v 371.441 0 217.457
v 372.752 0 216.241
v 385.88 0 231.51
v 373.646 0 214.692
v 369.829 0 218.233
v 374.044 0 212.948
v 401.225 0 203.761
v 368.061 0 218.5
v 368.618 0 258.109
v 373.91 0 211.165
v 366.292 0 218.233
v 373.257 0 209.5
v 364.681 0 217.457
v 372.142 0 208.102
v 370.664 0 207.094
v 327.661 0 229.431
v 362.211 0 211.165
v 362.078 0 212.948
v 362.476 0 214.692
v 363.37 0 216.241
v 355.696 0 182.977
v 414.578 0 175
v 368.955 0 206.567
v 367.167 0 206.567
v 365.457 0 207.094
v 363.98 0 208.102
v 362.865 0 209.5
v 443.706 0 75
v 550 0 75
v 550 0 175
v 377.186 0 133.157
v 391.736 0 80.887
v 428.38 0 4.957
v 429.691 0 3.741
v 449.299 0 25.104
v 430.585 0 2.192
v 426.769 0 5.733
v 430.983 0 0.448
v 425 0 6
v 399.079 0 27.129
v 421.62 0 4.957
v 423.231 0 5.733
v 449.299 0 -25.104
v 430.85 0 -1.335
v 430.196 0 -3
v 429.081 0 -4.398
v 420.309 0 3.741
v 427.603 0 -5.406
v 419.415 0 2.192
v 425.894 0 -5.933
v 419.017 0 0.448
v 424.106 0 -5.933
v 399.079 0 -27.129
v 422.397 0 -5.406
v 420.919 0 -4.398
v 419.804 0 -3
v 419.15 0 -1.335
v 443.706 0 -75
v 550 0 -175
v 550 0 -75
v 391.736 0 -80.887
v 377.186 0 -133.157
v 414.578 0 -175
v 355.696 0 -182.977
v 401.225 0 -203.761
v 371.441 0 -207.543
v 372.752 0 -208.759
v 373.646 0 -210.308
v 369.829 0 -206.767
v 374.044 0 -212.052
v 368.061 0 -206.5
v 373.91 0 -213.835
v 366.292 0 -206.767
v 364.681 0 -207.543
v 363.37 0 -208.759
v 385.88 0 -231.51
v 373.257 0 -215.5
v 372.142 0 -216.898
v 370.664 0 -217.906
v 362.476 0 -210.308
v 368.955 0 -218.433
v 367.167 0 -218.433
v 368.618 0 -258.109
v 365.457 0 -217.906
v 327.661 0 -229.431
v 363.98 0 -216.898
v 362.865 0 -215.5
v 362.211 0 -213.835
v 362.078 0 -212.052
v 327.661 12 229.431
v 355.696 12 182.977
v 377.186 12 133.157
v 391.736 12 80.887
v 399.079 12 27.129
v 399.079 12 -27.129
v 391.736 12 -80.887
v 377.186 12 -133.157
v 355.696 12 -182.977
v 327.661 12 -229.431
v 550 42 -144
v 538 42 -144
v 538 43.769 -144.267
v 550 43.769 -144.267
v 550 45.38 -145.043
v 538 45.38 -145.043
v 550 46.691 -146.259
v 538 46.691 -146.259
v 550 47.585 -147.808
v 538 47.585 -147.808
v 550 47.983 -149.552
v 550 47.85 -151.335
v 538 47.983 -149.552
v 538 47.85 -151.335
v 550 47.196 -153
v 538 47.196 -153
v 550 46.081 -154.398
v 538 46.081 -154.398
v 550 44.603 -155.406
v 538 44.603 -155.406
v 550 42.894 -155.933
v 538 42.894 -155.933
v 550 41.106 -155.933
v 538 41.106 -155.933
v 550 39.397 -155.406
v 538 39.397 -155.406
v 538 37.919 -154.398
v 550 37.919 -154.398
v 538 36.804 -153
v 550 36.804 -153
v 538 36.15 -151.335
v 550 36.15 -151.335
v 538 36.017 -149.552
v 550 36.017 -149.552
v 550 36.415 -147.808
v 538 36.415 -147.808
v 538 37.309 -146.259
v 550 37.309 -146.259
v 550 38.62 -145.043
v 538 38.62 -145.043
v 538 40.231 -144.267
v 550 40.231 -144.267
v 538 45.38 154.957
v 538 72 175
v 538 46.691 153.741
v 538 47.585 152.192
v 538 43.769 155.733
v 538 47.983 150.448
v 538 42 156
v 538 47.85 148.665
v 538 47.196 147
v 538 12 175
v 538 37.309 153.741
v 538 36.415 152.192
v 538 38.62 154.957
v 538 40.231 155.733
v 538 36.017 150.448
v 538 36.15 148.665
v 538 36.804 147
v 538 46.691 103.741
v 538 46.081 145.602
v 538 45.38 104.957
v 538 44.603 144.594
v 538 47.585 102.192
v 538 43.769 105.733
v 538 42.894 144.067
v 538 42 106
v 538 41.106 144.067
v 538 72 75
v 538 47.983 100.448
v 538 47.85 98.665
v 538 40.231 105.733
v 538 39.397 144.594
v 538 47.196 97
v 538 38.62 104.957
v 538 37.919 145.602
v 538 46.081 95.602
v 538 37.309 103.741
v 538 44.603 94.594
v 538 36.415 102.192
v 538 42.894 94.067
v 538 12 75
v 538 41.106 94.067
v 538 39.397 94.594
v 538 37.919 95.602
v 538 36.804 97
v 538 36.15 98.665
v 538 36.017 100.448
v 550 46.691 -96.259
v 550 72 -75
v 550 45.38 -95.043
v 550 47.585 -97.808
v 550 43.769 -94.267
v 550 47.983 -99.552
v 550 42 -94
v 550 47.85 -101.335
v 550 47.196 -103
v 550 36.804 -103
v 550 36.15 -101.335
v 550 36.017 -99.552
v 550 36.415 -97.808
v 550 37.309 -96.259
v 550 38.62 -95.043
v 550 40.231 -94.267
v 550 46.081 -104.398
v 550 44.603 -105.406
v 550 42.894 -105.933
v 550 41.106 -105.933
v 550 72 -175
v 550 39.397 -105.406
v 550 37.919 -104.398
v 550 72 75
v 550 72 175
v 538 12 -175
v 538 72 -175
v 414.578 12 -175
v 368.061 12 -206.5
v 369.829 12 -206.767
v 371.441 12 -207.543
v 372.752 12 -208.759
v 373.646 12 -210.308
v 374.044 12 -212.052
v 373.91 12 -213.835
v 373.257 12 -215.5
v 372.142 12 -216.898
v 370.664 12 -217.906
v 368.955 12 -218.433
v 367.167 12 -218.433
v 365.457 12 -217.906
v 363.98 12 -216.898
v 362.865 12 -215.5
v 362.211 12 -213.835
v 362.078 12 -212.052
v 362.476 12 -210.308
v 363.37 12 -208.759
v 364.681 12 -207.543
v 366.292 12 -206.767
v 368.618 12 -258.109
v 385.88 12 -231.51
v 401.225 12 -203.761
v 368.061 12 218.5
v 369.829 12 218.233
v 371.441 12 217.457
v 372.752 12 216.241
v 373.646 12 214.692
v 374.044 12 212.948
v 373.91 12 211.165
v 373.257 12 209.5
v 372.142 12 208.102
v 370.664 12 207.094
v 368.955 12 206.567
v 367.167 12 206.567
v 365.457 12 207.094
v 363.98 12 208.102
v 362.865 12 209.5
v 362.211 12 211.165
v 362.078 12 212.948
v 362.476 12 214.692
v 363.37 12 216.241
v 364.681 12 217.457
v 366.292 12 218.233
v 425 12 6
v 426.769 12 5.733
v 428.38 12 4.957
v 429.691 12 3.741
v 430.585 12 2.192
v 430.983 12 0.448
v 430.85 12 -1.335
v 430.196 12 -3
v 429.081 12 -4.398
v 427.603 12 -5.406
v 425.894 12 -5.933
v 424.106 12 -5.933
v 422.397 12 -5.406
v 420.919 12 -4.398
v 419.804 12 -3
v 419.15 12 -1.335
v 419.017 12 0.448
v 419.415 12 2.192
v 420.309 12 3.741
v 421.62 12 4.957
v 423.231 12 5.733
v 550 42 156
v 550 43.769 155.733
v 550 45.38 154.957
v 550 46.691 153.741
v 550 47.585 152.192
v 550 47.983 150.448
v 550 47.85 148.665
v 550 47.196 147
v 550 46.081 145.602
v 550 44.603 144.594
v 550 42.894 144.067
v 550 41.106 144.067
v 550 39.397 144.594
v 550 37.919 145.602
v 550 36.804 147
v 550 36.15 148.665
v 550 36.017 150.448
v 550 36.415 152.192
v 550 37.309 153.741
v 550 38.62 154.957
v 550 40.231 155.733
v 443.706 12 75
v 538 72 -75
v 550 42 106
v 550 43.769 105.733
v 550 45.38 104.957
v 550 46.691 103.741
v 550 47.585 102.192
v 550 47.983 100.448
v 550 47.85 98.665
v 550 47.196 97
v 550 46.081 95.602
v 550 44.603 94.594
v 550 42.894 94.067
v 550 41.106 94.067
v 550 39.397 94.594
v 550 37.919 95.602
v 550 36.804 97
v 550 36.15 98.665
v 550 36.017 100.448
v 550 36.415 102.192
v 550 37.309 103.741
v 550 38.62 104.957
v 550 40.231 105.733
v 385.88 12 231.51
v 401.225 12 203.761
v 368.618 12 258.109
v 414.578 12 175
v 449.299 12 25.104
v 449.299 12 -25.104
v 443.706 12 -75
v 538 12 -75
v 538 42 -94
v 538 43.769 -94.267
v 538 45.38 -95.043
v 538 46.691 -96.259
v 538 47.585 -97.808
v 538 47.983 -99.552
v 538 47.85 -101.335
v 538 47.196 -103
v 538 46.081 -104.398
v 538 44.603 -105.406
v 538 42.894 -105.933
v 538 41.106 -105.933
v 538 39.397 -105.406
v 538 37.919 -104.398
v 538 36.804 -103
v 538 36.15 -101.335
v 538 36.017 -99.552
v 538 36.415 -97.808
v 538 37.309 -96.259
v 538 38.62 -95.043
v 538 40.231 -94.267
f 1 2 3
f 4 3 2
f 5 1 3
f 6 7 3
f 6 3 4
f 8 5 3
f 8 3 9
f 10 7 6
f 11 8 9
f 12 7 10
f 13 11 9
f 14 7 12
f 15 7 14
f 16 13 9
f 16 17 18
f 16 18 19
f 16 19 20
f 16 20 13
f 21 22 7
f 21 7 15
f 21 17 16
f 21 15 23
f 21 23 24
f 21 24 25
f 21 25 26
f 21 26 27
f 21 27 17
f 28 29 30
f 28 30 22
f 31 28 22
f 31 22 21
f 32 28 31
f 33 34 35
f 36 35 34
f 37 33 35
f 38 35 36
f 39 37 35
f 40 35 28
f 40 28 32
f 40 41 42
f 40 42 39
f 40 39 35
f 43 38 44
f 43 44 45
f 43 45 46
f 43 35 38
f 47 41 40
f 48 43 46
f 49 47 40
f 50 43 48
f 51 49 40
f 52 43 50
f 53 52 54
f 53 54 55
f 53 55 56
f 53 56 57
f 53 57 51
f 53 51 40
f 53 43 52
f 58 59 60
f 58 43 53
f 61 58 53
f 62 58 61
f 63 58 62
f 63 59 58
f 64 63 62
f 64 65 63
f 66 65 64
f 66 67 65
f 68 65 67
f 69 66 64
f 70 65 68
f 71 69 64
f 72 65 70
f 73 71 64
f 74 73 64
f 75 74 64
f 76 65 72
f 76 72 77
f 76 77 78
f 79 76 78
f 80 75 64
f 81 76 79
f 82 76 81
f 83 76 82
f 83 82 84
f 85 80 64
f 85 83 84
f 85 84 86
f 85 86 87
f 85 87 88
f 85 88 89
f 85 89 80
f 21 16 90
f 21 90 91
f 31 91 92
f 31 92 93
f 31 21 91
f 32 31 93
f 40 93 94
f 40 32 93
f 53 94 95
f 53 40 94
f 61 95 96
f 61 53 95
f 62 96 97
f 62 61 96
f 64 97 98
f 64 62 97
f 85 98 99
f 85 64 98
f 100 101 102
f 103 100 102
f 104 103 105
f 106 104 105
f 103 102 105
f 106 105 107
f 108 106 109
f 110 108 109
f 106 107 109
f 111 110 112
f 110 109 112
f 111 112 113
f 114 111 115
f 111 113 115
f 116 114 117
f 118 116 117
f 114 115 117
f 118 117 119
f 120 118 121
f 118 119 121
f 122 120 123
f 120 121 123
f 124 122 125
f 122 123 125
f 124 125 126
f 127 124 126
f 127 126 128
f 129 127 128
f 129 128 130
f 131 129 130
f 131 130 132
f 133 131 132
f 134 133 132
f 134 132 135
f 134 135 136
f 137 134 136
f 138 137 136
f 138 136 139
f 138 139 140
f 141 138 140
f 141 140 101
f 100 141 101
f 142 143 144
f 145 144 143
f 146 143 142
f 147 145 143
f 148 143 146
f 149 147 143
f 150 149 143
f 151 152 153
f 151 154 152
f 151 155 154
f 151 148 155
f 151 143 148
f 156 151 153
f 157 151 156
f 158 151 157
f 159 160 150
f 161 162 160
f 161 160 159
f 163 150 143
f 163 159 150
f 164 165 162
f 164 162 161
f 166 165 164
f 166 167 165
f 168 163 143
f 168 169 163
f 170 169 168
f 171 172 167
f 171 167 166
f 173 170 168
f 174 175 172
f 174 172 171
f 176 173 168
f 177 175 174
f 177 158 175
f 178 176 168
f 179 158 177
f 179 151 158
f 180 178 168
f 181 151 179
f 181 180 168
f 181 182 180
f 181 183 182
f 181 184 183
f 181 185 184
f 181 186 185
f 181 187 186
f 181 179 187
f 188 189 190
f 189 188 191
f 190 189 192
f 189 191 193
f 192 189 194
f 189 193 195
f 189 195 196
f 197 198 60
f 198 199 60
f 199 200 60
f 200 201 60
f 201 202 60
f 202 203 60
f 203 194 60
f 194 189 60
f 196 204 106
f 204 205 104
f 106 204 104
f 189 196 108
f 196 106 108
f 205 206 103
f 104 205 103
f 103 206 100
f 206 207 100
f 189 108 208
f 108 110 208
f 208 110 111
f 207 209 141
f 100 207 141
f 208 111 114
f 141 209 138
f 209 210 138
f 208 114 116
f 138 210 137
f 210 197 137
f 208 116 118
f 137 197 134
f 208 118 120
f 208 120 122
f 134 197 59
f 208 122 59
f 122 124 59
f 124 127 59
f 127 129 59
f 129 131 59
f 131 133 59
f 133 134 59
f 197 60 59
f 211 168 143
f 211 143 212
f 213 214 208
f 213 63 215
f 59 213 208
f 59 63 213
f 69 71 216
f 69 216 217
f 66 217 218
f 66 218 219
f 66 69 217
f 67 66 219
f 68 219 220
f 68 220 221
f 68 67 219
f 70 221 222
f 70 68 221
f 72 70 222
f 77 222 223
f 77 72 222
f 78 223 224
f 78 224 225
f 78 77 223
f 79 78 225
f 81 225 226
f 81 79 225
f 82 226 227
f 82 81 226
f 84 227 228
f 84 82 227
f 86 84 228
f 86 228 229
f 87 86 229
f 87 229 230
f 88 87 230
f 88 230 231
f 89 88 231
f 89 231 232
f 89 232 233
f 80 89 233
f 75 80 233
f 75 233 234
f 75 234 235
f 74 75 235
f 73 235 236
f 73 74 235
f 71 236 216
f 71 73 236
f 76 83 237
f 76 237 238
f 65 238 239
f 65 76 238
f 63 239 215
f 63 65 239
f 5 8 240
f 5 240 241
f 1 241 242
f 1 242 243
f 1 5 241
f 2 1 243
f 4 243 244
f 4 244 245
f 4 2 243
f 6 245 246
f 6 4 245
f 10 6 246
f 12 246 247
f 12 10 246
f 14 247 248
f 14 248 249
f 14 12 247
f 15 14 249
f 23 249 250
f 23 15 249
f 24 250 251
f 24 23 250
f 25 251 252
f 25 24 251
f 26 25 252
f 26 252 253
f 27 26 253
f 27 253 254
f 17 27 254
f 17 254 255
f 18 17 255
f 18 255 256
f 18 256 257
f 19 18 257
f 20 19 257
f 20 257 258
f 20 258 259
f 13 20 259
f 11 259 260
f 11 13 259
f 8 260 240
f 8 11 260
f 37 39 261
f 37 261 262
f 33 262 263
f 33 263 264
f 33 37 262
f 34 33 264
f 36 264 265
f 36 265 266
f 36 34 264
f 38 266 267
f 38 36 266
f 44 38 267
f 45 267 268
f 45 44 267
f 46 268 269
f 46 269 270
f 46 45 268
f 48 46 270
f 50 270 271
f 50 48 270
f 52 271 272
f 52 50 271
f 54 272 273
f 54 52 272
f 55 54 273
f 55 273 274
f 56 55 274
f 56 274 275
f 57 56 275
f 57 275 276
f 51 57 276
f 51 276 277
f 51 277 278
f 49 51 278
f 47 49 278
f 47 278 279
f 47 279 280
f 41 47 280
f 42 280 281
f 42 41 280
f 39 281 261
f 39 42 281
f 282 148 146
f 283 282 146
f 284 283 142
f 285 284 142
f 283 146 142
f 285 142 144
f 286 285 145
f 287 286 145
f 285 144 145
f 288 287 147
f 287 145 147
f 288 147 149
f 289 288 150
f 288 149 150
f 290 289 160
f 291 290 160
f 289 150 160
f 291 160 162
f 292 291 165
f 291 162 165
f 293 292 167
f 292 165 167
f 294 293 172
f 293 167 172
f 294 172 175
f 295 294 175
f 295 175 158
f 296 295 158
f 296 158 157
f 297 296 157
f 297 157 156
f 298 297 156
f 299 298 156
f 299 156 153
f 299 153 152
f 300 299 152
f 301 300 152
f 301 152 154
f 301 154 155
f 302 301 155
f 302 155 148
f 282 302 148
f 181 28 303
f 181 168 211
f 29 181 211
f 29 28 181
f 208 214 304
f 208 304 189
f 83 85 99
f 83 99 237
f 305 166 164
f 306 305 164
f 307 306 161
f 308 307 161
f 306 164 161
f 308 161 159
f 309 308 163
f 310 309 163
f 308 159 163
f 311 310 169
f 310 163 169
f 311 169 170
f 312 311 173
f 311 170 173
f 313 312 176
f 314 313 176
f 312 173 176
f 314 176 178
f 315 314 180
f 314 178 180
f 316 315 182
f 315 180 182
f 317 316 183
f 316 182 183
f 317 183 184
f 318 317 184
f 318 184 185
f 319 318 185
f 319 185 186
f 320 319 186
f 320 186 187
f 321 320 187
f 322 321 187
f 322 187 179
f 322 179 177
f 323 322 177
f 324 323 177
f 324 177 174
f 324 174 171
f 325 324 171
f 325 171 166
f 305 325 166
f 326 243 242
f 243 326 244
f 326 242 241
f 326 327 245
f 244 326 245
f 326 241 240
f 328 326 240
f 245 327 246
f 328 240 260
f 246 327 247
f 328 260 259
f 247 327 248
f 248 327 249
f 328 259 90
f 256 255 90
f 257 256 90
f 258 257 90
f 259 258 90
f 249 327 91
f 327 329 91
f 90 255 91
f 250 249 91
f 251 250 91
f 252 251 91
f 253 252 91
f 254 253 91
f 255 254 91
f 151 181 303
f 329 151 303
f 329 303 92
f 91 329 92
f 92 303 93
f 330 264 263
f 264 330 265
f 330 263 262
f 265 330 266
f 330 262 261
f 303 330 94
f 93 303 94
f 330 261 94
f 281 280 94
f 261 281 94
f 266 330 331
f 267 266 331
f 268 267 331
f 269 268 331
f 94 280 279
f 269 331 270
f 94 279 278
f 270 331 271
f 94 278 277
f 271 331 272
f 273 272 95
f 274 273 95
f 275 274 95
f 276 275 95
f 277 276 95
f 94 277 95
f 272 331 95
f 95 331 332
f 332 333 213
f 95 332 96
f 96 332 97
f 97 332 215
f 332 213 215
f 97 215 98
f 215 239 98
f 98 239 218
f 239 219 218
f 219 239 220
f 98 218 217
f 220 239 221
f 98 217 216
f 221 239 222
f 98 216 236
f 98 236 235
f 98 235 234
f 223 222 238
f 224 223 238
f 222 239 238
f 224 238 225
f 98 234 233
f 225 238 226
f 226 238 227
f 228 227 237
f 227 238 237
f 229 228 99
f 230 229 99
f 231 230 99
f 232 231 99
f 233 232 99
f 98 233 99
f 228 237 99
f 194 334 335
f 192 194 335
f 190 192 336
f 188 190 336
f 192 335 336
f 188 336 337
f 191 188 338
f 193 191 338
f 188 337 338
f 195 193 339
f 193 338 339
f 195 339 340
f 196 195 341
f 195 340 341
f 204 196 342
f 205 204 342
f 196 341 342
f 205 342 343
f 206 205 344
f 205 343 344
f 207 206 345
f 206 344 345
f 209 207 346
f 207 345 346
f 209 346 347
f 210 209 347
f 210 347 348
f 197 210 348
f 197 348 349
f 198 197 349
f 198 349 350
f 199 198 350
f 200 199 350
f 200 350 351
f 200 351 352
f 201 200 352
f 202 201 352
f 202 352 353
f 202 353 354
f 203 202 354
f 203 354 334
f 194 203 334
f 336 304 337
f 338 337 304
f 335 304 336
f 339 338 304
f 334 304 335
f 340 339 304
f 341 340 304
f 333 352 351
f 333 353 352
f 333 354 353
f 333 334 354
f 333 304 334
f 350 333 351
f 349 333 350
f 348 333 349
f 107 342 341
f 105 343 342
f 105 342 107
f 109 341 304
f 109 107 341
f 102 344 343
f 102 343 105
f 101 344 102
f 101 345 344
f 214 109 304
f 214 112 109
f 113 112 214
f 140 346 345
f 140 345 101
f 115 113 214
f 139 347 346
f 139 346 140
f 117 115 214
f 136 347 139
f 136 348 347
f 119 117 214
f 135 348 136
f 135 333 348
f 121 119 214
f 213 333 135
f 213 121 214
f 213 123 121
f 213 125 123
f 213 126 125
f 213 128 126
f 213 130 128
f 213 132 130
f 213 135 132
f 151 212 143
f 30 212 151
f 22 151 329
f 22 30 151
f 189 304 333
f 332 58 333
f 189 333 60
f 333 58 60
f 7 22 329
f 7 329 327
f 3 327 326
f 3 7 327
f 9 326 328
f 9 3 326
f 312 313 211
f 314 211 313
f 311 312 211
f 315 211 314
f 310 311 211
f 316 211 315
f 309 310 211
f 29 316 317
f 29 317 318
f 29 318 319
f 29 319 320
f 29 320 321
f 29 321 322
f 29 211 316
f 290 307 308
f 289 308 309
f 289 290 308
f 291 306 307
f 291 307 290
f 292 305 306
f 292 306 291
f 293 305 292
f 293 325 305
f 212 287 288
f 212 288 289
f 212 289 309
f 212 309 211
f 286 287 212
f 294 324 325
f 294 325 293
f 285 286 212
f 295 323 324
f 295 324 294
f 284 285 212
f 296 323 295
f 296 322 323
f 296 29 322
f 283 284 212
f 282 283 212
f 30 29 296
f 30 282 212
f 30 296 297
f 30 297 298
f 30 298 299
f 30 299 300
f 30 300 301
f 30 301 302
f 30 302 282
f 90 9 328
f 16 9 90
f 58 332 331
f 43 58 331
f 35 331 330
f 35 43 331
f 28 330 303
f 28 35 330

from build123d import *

# Parameters (mm, degrees)
SKETCH1_R           = 6
BOSS_EXTRUDE2_DEPTH = 12
SKETCH2_W           = 12
SKETCH2_H           = 100
BOSS_EXTRUDE3_DEPTH = 60
SKETCH3_R           = 6
CUT_EXTRUDE1_DEPTH  = 341.65676581


with BuildPart() as part:
    # Sketch1 → Boss-Extrude2 (new body)
    with BuildSketch(Plane(origin=(0, 0, 0), x_dir=(1, 0, 0), z_dir=(0, 1, 0))):
        with BuildLine():
            Line((550, 175), (550, 75))
            Line((550, 75), (443.705983732, 75))
            ThreePointArc((443.705983732, 75), (450, 0), (443.705983732, -75))
            Line((443.705983732, -75), (550, -75))
            Line((550, -75), (550, -175))
            Line((550, -175), (414.578098794, -175))
            ThreePointArc((414.578098794, -175), (393.796888861, -217.770545124), (368.61841993, -258.109396358))
            Line((368.61841993, -258.109396358), (327.660817716, -229.43057454))
            ThreePointArc((327.660817716, -229.43057454), (400, 0), (327.660817716, 229.43057454))
            Line((327.660817716, 229.43057454), (368.61841993, 258.109396358))
            ThreePointArc((368.61841993, 258.109396358), (393.796888861, 217.770545124), (414.578098794, 175))
            Line((414.578098794, 175), (550, 175))
        make_face()
        with Locations(Location((368.060796608, -212.5, 0), (0, 0, 270))):
            Circle(SKETCH1_R, mode=Mode.SUBTRACT)
        with Locations(Location((425, 0, 0), (0, 0, 270))):
            Circle(SKETCH1_R, mode=Mode.SUBTRACT)
        with Locations(Location((368.060796608, 212.5, 0), (0, 0, 270))):
            Circle(SKETCH1_R, mode=Mode.SUBTRACT)
    extrude(amount=BOSS_EXTRUDE2_DEPTH)

    # Sketch2 → Boss-Extrude3 (add)
    with BuildSketch(Plane(origin=(0, 12, 0), x_dir=(1, 0, 0), z_dir=(0, 1, 0))):
        with Locations((544, 125)):
            Rectangle(SKETCH2_W, SKETCH2_H)
        with Locations((544, -125)):
            Rectangle(SKETCH2_W, SKETCH2_H)
    extrude(amount=BOSS_EXTRUDE3_DEPTH)

    # Sketch3 → Cut-Extrude1 (cut, through all)
    with BuildSketch(Plane.ZY.offset(-538)):
        with Locations((-150, 42)):
            Circle(SKETCH3_R)
        with Locations((-100, 42)):
            Circle(SKETCH3_R)
        with Locations((100, 42)):
            Circle(SKETCH3_R)
        with Locations((150, 42)):
            Circle(SKETCH3_R)
    extrude(amount=-CUT_EXTRUDE1_DEPTH, mode=Mode.SUBTRACT)


solid = part.part
